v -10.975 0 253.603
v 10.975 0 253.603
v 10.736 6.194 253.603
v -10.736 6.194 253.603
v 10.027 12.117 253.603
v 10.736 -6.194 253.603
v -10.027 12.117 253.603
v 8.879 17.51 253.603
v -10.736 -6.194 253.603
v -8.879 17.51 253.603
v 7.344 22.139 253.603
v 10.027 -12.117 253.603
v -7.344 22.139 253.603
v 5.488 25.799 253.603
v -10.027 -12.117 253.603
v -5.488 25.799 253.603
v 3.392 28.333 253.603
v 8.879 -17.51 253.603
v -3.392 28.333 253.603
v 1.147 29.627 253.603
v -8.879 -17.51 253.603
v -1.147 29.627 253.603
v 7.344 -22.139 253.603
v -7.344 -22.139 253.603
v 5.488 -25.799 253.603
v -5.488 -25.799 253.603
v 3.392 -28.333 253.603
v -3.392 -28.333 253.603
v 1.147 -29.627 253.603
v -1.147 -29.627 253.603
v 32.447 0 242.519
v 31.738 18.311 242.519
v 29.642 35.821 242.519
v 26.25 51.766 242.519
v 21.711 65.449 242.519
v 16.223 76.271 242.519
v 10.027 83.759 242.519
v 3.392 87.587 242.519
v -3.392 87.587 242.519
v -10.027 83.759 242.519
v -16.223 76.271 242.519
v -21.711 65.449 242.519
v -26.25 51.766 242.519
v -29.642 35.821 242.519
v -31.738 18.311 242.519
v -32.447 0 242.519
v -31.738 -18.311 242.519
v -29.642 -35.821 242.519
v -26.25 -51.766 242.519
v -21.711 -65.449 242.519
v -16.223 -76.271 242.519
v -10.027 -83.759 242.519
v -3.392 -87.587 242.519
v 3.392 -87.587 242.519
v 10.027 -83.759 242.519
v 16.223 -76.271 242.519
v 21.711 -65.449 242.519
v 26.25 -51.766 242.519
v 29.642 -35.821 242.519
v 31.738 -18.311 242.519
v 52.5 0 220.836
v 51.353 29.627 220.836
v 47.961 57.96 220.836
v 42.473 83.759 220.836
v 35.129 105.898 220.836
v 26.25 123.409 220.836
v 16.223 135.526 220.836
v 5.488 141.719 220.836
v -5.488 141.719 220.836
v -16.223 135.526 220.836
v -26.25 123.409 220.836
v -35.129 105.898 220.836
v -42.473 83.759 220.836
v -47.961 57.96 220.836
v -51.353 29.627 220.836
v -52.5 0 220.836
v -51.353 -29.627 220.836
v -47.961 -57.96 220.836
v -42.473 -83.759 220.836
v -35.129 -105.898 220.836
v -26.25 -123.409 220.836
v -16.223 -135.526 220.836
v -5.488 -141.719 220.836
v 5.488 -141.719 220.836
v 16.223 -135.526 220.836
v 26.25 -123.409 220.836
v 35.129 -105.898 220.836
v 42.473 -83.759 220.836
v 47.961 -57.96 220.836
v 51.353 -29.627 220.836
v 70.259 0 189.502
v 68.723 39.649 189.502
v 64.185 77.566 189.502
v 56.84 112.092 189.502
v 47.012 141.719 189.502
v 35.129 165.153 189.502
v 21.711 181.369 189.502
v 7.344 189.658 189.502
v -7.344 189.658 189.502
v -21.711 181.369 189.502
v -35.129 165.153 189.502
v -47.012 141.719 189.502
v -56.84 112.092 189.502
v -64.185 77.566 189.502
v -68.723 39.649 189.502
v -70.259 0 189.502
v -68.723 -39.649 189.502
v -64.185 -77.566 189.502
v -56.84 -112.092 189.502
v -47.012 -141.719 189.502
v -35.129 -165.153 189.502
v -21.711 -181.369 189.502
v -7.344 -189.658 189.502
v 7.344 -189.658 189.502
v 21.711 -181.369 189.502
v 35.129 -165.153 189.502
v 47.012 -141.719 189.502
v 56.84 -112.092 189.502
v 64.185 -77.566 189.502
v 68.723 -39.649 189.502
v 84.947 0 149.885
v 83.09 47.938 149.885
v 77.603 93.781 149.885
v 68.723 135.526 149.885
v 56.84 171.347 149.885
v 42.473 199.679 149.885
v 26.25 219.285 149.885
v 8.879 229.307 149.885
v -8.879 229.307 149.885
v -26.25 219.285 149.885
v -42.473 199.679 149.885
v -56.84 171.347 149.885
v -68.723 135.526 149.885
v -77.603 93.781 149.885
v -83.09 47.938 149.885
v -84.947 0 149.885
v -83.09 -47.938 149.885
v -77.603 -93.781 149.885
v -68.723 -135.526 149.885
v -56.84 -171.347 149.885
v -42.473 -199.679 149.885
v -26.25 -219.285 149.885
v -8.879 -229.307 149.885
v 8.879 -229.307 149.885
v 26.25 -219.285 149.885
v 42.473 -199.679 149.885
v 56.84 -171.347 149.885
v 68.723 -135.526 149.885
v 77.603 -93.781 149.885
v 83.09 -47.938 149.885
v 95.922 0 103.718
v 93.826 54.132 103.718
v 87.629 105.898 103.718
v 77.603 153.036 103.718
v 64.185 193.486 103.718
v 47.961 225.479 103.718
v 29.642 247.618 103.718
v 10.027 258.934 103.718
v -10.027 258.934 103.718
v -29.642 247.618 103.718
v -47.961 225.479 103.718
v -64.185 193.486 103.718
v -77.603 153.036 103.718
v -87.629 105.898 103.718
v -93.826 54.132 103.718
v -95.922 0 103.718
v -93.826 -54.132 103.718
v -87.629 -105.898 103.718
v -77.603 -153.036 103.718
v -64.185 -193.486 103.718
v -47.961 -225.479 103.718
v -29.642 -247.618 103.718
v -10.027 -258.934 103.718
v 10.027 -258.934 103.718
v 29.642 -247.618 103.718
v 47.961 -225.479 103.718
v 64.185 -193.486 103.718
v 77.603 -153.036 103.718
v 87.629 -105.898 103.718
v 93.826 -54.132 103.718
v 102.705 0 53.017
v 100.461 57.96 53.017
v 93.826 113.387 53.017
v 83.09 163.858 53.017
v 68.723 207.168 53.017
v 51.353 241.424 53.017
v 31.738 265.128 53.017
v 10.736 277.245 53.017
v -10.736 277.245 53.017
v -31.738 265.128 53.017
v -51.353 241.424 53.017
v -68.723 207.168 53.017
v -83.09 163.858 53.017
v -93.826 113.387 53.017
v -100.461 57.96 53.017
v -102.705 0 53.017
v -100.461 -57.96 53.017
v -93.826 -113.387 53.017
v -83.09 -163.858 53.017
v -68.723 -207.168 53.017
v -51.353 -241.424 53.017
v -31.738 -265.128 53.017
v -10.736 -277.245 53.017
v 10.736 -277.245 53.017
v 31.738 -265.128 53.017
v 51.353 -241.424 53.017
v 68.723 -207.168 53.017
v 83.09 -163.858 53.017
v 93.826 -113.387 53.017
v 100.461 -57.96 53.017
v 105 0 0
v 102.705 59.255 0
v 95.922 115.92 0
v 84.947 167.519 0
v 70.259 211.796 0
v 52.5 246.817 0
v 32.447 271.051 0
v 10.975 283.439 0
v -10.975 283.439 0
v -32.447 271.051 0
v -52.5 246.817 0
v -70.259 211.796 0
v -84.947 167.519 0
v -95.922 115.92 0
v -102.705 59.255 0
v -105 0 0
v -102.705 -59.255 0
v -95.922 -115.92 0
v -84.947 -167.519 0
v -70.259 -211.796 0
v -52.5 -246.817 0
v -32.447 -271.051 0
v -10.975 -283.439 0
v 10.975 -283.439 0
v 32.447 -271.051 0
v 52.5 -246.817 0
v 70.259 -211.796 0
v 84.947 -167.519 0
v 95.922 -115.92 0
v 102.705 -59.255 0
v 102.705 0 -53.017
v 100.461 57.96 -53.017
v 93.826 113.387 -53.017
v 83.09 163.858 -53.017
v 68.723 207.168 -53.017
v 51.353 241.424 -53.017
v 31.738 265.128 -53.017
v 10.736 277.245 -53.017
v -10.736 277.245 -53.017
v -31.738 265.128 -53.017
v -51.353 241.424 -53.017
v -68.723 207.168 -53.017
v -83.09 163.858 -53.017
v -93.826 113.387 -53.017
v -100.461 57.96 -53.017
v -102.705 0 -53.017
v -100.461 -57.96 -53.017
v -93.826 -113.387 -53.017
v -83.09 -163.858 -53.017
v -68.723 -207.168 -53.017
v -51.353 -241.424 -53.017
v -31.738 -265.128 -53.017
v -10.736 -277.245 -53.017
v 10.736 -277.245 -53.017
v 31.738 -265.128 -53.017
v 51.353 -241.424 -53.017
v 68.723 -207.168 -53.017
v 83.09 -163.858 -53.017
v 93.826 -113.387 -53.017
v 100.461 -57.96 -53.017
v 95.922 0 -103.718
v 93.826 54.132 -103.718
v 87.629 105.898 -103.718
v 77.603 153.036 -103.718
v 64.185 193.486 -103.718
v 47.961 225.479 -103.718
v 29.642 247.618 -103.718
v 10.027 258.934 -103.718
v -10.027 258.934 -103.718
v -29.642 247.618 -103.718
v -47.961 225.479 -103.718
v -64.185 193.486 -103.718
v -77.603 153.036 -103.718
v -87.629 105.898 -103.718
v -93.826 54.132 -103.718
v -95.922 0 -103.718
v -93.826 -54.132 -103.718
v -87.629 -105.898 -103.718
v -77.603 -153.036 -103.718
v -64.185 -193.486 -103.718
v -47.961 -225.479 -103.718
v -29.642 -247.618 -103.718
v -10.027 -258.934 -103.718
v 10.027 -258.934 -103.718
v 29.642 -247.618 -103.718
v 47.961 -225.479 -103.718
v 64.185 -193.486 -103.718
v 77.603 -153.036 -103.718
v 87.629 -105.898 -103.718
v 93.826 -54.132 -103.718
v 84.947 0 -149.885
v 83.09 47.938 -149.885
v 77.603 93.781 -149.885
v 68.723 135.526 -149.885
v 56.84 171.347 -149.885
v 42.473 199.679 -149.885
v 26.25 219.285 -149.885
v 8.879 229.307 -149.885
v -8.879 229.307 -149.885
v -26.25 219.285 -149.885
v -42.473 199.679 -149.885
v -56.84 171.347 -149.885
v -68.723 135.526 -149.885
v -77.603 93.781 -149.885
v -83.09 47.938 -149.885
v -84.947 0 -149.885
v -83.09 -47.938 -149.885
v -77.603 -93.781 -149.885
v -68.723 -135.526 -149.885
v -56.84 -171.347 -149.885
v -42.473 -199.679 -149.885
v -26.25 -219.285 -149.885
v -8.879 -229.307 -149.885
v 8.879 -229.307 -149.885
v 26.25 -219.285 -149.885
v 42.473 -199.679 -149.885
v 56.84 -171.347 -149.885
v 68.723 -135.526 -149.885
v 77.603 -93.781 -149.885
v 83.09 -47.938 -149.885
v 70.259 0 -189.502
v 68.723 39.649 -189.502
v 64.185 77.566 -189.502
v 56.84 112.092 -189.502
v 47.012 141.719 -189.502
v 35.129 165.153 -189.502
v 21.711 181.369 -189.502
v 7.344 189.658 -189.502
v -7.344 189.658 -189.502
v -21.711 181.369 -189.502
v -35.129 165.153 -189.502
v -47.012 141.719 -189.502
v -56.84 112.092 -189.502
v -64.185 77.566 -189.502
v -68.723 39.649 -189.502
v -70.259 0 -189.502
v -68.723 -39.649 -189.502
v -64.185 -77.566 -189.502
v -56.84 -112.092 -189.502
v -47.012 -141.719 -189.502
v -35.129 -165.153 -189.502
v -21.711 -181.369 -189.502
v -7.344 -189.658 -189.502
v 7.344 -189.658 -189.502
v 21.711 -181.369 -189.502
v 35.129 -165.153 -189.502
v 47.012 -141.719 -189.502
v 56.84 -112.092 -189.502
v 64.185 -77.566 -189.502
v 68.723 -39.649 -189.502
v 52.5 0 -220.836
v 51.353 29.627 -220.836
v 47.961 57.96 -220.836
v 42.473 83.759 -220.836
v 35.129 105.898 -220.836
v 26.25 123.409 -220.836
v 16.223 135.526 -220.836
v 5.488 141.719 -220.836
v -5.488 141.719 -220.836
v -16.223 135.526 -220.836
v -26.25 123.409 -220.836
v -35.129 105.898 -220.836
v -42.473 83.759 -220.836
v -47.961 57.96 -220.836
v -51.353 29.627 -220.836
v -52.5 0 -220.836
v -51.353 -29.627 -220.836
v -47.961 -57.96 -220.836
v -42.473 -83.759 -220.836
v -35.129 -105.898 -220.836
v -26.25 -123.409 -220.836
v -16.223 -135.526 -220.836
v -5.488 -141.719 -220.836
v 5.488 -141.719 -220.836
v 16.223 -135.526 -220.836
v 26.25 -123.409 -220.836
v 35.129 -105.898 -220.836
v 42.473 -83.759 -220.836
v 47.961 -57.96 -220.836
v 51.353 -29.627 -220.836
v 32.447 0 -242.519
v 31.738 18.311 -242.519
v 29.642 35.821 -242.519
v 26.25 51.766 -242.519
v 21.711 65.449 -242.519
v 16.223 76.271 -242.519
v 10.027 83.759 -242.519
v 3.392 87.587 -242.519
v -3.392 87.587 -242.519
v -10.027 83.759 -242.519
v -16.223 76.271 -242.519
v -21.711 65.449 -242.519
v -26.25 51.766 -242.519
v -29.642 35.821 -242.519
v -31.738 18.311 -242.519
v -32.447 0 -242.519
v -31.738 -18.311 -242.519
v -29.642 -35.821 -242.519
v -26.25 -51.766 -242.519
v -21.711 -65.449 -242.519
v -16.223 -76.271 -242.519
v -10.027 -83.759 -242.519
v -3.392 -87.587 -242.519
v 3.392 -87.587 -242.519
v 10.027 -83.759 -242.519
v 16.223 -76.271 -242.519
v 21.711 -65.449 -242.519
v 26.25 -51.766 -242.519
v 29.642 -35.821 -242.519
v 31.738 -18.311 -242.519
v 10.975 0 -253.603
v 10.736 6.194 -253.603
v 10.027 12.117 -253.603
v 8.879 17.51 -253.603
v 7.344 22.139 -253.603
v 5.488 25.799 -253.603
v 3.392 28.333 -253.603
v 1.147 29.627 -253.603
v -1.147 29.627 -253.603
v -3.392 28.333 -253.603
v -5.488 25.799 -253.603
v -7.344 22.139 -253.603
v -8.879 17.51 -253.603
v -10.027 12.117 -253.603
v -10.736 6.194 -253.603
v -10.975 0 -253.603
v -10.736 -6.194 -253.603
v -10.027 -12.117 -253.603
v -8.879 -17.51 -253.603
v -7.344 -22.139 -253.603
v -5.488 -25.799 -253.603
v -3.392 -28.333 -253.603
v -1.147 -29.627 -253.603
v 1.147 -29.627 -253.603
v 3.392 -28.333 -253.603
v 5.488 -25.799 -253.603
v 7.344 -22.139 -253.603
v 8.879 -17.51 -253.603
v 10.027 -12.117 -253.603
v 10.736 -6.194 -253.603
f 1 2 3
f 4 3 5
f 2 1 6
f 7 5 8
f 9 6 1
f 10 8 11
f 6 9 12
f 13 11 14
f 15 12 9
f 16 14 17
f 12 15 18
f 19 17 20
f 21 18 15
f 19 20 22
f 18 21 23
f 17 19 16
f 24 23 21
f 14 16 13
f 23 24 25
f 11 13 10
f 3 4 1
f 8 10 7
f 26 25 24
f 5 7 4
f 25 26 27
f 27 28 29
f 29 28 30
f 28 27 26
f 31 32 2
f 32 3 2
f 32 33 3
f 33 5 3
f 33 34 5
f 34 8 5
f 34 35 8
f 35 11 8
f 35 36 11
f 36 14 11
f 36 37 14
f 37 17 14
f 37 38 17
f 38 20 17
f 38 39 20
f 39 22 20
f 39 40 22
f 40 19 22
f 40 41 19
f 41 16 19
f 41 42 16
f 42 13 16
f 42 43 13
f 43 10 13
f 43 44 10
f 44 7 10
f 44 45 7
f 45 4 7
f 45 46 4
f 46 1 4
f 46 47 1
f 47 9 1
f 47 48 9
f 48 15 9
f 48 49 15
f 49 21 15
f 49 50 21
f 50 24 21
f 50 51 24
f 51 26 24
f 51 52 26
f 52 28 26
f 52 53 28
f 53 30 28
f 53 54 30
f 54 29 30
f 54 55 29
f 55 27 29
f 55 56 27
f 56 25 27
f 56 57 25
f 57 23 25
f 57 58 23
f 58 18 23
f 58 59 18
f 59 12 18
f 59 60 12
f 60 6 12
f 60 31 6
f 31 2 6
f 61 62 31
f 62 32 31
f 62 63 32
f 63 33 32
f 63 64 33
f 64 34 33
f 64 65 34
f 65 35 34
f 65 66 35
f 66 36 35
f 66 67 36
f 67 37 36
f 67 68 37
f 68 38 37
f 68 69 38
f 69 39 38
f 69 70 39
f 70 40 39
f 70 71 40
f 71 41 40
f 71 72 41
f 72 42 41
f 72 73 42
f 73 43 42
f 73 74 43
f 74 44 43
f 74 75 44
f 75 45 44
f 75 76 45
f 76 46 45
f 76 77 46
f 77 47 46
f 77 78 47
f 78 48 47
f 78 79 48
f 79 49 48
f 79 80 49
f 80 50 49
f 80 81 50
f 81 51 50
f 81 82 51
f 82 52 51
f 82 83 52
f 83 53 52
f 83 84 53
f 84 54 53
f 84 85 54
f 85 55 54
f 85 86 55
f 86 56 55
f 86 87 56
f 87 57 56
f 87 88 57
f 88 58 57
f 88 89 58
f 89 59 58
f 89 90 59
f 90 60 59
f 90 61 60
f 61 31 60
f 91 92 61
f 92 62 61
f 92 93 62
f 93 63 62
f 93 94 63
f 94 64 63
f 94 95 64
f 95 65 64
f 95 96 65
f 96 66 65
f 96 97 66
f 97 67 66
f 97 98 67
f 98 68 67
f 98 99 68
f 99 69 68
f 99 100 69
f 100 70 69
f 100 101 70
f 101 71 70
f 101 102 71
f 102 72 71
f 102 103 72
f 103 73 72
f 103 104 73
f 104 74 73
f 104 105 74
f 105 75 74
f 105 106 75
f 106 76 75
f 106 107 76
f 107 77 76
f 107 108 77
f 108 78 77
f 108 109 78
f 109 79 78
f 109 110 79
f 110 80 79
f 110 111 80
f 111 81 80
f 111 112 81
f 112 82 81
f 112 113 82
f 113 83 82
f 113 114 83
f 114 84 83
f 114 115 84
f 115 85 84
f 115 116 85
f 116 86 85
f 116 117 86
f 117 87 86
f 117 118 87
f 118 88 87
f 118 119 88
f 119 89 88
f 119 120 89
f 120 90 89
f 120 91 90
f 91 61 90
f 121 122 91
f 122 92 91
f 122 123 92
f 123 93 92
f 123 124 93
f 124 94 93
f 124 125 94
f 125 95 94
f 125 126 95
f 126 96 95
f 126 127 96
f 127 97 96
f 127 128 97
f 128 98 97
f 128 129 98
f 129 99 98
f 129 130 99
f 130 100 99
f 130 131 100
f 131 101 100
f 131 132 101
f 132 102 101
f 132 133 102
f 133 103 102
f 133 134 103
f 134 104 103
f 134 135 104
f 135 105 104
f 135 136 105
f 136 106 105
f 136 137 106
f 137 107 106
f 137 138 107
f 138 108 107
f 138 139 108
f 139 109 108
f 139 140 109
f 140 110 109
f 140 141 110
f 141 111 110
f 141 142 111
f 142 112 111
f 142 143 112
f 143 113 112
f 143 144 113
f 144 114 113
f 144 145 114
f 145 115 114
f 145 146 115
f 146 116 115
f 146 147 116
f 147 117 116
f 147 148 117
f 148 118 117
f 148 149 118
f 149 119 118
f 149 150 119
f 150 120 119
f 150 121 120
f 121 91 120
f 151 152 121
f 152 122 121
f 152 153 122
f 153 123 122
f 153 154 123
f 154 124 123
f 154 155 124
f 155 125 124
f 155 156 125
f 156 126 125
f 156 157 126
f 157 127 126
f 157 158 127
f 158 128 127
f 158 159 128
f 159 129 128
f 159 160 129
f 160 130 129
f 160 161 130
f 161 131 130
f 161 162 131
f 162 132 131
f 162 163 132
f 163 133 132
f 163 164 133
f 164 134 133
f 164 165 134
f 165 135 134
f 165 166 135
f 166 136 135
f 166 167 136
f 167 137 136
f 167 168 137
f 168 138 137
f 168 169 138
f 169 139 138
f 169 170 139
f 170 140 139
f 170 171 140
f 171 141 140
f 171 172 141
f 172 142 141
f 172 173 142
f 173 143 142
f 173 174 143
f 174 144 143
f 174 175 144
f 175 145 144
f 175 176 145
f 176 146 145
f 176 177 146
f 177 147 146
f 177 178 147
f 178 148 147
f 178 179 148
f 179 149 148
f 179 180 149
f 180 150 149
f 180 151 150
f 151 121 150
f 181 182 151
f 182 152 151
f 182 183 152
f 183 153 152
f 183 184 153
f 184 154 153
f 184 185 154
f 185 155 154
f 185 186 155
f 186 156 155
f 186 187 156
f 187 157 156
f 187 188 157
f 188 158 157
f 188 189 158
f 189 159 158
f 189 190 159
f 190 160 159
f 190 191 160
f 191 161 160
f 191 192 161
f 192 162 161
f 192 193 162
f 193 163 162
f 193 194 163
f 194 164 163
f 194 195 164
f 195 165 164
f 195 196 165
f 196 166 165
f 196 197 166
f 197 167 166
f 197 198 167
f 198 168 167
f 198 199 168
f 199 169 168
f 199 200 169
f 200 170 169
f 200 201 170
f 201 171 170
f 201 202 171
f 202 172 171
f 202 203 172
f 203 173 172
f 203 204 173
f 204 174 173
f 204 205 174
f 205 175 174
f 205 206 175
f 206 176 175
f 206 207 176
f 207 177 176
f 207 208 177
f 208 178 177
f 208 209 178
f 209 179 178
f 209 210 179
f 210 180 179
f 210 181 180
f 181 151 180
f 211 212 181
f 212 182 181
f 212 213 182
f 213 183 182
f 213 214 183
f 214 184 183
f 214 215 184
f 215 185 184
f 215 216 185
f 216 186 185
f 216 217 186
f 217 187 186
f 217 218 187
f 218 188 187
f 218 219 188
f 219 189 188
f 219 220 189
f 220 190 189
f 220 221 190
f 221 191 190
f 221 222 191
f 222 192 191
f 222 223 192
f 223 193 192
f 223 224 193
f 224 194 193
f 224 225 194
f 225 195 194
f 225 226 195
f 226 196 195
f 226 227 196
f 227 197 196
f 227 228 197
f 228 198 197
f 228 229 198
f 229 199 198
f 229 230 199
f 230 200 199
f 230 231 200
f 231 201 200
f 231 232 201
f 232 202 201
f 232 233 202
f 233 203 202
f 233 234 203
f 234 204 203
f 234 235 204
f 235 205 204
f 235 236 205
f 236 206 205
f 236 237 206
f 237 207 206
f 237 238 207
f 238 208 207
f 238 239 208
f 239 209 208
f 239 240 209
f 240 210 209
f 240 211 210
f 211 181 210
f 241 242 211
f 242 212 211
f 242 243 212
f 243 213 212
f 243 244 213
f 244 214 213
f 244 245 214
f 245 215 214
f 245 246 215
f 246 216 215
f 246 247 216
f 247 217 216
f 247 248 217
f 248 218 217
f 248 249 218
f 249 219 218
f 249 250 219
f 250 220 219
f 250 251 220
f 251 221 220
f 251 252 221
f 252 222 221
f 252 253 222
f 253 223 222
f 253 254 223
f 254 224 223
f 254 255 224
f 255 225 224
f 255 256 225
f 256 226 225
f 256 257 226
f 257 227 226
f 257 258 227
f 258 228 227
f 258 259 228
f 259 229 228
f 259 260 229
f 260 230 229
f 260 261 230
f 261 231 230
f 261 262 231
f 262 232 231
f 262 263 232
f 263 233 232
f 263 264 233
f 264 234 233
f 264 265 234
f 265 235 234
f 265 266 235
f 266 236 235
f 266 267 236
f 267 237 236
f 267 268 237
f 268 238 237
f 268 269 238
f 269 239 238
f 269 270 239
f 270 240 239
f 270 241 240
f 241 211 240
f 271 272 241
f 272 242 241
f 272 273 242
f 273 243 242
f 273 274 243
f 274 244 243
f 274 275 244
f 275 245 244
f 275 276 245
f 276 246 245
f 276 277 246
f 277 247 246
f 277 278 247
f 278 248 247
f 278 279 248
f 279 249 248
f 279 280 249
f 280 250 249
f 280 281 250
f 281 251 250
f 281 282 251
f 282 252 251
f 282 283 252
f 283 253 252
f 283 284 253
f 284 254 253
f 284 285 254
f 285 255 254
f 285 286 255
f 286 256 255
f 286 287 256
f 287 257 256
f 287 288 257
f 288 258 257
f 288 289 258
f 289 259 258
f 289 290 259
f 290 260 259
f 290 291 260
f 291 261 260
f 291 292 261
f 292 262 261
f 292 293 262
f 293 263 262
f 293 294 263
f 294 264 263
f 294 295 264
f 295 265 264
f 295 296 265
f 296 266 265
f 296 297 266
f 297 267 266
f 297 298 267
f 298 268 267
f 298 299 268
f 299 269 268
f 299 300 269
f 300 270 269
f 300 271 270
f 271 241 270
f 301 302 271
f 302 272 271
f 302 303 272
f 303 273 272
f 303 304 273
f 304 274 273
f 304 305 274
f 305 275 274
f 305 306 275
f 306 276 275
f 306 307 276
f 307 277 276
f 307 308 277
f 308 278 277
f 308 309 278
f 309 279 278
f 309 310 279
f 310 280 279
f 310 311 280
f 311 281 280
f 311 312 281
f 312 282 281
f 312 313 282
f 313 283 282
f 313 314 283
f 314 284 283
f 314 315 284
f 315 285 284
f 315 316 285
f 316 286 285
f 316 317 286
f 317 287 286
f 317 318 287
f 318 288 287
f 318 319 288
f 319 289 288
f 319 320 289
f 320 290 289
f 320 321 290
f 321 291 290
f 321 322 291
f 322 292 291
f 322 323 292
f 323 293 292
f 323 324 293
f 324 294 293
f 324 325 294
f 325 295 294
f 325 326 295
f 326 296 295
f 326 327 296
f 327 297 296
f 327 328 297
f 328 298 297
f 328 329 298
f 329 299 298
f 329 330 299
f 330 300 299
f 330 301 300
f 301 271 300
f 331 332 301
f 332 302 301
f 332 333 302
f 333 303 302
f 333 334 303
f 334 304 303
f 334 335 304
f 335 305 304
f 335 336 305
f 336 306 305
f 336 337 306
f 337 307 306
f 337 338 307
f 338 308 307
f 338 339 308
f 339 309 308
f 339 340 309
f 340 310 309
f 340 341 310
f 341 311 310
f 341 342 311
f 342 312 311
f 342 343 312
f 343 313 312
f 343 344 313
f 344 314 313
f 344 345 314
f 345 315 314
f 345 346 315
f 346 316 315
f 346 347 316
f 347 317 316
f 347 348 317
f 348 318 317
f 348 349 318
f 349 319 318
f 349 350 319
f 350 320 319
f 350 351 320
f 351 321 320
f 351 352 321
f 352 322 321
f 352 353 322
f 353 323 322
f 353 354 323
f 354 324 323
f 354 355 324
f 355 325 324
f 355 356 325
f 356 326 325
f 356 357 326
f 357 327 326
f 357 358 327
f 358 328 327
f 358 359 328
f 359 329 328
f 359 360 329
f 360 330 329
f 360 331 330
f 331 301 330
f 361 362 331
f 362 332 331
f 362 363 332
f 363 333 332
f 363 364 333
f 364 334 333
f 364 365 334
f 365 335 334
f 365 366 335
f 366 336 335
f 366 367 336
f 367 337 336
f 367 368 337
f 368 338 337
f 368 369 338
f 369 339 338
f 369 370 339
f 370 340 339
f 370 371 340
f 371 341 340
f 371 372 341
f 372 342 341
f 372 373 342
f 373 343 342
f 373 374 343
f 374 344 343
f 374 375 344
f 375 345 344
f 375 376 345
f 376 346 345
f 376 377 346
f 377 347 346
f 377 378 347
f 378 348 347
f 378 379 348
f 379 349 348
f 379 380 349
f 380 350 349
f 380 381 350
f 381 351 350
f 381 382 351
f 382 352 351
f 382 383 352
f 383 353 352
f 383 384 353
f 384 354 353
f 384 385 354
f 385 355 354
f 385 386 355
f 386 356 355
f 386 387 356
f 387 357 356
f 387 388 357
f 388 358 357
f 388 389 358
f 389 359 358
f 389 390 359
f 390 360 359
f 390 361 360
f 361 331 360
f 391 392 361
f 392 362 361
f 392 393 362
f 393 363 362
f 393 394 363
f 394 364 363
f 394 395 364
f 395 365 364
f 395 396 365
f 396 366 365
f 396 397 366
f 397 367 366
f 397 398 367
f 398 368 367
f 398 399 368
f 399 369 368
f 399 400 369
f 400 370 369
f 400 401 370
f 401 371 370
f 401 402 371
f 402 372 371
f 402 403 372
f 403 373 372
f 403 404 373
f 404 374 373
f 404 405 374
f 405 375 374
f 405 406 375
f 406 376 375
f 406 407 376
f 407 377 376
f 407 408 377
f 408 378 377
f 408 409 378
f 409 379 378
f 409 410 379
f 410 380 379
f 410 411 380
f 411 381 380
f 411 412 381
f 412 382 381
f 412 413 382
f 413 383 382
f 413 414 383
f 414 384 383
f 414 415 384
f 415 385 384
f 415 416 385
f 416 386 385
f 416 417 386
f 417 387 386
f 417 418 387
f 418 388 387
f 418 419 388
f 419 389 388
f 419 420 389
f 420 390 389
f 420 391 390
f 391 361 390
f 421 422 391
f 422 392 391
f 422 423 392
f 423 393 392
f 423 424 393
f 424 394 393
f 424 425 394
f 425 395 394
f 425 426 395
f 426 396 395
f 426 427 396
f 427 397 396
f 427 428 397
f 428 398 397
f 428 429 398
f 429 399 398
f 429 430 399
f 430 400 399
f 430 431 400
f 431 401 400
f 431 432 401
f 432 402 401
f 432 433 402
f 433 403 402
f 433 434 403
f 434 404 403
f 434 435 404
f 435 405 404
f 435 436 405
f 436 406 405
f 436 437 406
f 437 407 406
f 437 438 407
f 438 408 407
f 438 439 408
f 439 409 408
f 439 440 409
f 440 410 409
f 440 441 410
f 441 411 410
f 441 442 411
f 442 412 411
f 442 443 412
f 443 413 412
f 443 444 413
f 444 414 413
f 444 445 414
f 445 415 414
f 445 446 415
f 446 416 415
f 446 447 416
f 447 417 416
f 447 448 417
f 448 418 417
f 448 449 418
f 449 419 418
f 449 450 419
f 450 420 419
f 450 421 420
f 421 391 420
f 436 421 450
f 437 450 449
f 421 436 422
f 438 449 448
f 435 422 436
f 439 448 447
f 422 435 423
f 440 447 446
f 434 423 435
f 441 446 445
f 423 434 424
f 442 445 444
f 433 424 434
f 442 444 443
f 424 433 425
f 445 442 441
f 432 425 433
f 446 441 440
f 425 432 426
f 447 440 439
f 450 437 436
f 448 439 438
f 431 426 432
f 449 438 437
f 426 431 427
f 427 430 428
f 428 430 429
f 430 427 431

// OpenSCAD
// Generated by SolidPython 1.0.1 on 2020-07-29 00:46:48


scale(v = [7, 19, 17]) {
	sphere(r = 15);
}
/***********************************************
*********      SolidPython code:      **********
************************************************
 
# import packages: SolidPython
from solid import *
from solid.utils import *
from itertools import chain, combinations, permutations


class Resize:

    def __init__(self, scad_file):
        self.scad_file = scad_file
        #self.scad_file = import_scad(scad_file)
        # cone/cylinder param:
        self.r1 = 0
        self.r2 = 0
        self.h = 0
        # rectangular prism param:
        self.w = 0
        self.l = 0
        # ellipse param:
        self.r = 0

    # import OpenScad code (file name corresponds to shape)


    # classify shape + parameters
    def assign(self, param1, param2, param3):
        if self.scad_file == 'cone.scad':
            self.r1 = param1
            self.r2 = param2
            self.h = param3
        elif self.scad_file == 'cylinder.scad':
            self.r1 = param1
            self.r2 = param2
            self.h = param3
        elif self.scad_file == 'rectangularPrism.scad':
            self.h = param1
            self.l = param2
            self.w = param3
        else:
            self.r = param1
            self.h = param2

    # resize parameters
    def iterate(self):
        x = range(3, 20, 2)
        i = 1
        if self.scad_file == 'cone.scad':
            tempList = list(permutations(x, 2))
            for temp in tempList:
                param1 = temp[0]
                param2 = temp[1]
                filepath = 'produced_scad_files/' + 'cone' + str(param1) + '_' + str(param2) + '_' + '.scad'
                scad_render_to_file(cylinder(h=param1, r1=param2, r2=0), filepath)

        elif self.scad_file == 'cylinder.scad':
            tempList = list(permutations(x, 3))
            for temp in tempList:
                param1 = temp[0]
                param2 = temp[1]
                filepath = 'produced_scad_files/' + 'cylinder' + str(param1) + '_' + str(param2) + '_' + '.scad'
                scad_render_to_file(cylinder(h=param1, r1=param2, r2=param2), filepath)

        elif self.scad_file == 'rectangularPrism.scad':
            tempList = list(permutations(x, 3))
            for temp in tempList:
                param1 = temp[0]
                param2 = temp[1]
                param3 = temp[2]
                filepath = 'produced_scad_files/' + 'rectangularPrism' + str(param1) + '_' + str(param2) + '_' + str(
                    param3) + '.scad'
                scad_render_to_file(cube(size=(param1, param2, param3)), filepath)

        elif self.scad_file == 'ellipse.scad':
            tempList = list(permutations(x, 4))
            for temp in tempList:
                param1 = temp[0]
                param2 = temp[1]
                param3 = temp[2]
                param4 = temp[3]
                filepath = 'produced_scad_files/' + 'ellipse' + str(param1) + '_' + str(param2) + '_' + str(param3) + '_' + str(param4) + '.scad'
                scad_render_to_file(scale([param1, param2, param3])(sphere(r=param4)), filepath)

    def render_to_scadfile(self):
        scad_render_to_file(scad, 'example.scad') 
 
************************************************/
